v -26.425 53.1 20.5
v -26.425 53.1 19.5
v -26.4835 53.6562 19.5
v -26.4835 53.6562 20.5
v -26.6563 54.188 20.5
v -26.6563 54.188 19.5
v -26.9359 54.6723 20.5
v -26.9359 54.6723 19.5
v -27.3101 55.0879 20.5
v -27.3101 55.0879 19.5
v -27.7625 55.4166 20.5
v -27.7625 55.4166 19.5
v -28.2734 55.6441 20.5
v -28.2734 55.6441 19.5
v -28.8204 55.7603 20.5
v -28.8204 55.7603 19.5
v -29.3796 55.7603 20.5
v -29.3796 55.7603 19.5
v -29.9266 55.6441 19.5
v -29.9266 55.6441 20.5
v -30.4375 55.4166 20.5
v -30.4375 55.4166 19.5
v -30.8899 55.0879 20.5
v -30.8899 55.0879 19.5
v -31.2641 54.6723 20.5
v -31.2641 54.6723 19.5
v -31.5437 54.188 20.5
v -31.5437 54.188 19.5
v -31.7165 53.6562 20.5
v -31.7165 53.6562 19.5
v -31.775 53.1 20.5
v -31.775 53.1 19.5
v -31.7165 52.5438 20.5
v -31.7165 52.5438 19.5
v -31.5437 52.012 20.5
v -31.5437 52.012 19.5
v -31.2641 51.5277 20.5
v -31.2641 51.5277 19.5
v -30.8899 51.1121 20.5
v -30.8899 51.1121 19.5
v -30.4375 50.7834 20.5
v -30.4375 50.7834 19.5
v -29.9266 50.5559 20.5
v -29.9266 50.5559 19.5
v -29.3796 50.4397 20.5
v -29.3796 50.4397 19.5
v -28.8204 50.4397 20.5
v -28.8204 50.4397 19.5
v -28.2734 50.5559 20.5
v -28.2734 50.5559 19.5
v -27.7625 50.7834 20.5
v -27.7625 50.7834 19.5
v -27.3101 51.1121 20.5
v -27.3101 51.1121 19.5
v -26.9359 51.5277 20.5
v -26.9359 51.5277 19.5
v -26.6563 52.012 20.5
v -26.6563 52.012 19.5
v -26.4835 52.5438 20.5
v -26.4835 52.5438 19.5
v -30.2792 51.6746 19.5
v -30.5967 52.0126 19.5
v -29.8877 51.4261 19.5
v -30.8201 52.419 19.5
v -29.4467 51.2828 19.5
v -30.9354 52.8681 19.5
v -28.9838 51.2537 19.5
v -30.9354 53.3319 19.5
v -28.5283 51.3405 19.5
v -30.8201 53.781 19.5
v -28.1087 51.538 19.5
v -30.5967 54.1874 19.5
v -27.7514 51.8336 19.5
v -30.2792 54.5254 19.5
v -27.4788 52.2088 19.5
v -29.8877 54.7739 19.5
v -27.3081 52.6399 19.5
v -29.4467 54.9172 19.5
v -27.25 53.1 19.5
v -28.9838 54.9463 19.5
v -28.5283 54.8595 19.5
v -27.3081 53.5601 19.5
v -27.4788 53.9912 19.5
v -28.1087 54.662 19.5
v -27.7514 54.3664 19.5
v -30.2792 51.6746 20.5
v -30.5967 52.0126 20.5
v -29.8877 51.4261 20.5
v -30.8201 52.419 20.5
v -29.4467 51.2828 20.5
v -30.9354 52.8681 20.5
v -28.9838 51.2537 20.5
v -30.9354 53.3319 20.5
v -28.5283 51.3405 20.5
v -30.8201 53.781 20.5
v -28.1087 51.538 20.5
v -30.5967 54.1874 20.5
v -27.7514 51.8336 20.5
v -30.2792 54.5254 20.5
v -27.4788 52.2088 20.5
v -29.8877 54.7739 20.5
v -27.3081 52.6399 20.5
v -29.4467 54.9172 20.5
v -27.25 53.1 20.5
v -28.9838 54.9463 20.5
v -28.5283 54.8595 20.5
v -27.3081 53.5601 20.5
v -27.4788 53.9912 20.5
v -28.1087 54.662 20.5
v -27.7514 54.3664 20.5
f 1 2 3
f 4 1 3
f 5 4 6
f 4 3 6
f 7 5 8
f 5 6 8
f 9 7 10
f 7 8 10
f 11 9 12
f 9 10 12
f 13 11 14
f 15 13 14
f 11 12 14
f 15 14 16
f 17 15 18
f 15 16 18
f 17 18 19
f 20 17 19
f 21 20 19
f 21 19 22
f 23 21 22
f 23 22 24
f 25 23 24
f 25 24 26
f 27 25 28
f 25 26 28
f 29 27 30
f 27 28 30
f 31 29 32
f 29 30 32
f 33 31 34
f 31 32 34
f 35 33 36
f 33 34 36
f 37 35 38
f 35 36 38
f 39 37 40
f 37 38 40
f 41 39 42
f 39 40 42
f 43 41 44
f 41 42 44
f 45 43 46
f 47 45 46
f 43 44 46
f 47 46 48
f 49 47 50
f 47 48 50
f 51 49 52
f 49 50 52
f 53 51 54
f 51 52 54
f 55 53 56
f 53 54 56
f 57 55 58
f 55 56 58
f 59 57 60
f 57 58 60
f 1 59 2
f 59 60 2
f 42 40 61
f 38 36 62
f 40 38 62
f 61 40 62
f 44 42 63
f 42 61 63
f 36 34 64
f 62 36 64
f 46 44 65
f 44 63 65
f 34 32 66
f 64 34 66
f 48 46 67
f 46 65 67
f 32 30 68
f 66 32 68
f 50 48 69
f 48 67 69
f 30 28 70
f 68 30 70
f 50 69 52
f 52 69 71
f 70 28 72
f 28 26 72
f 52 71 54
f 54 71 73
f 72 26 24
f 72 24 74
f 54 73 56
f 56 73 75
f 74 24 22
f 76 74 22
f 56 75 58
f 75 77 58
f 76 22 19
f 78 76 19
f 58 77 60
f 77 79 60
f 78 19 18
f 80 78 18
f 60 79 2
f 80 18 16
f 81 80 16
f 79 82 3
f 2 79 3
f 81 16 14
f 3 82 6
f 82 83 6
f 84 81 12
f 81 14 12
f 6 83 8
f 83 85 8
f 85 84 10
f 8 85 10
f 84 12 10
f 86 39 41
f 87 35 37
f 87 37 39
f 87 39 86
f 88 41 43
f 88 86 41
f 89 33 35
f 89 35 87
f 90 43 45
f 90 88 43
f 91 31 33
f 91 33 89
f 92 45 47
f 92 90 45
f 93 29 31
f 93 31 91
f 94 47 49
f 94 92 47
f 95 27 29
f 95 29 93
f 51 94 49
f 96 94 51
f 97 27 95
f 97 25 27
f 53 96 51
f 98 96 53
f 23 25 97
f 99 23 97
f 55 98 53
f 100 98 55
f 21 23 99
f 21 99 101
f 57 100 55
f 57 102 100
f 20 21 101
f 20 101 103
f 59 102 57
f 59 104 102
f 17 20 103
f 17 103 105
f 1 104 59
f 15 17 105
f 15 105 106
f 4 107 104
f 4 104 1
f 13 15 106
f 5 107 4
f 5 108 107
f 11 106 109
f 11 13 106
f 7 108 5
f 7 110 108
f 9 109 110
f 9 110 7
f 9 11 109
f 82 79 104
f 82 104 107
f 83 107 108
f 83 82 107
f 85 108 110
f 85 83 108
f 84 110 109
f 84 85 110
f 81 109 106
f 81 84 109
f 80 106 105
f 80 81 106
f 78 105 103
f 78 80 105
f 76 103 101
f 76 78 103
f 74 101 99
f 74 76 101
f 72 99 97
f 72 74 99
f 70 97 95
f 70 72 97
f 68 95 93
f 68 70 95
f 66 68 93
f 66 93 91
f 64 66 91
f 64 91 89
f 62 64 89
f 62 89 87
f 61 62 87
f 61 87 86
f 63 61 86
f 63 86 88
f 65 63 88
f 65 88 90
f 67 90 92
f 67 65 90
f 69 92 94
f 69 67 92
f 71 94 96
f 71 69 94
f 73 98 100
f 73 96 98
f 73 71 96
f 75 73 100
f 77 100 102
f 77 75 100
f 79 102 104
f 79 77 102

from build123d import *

# Parameters (mm, degrees)
CYLINDER038_R     = 1.85
CYLINDER038_DEPTH = 3.5
CYLINDER037_R     = 2.675
CYLINDER037_DEPTH = 1


with BuildPart() as vaciado_tope016:
    # Cylinder038 → Cylinder038 (new body)
    with BuildSketch(Plane(origin=(-29.1, 53.1, 24.6), x_dir=(1, 0, 0), z_dir=(0, 0, 1))):
        Circle(CYLINDER038_R)
    extrude(amount=CYLINDER038_DEPTH)


with BuildPart() as arandela_2mm001:
    # Cylinder037 → Cylinder037 (new body)
    with BuildSketch(Plane(origin=(-29.1, 53.1, 25.2), x_dir=(1, 0, 0), z_dir=(0, 0, 1))):
        Circle(CYLINDER037_R)
    extrude(amount=CYLINDER037_DEPTH)

    # Cut020: cut vaciado tope016
    add(vaciado_tope016.part, mode=Mode.SUBTRACT)


with BuildPart() as arandela_2mm001_1:
    # Cut020 placement: moved
    add(arandela_2mm001.part.moved(Location((0, 0, -5.7))))


solid = arandela_2mm001_1.part
